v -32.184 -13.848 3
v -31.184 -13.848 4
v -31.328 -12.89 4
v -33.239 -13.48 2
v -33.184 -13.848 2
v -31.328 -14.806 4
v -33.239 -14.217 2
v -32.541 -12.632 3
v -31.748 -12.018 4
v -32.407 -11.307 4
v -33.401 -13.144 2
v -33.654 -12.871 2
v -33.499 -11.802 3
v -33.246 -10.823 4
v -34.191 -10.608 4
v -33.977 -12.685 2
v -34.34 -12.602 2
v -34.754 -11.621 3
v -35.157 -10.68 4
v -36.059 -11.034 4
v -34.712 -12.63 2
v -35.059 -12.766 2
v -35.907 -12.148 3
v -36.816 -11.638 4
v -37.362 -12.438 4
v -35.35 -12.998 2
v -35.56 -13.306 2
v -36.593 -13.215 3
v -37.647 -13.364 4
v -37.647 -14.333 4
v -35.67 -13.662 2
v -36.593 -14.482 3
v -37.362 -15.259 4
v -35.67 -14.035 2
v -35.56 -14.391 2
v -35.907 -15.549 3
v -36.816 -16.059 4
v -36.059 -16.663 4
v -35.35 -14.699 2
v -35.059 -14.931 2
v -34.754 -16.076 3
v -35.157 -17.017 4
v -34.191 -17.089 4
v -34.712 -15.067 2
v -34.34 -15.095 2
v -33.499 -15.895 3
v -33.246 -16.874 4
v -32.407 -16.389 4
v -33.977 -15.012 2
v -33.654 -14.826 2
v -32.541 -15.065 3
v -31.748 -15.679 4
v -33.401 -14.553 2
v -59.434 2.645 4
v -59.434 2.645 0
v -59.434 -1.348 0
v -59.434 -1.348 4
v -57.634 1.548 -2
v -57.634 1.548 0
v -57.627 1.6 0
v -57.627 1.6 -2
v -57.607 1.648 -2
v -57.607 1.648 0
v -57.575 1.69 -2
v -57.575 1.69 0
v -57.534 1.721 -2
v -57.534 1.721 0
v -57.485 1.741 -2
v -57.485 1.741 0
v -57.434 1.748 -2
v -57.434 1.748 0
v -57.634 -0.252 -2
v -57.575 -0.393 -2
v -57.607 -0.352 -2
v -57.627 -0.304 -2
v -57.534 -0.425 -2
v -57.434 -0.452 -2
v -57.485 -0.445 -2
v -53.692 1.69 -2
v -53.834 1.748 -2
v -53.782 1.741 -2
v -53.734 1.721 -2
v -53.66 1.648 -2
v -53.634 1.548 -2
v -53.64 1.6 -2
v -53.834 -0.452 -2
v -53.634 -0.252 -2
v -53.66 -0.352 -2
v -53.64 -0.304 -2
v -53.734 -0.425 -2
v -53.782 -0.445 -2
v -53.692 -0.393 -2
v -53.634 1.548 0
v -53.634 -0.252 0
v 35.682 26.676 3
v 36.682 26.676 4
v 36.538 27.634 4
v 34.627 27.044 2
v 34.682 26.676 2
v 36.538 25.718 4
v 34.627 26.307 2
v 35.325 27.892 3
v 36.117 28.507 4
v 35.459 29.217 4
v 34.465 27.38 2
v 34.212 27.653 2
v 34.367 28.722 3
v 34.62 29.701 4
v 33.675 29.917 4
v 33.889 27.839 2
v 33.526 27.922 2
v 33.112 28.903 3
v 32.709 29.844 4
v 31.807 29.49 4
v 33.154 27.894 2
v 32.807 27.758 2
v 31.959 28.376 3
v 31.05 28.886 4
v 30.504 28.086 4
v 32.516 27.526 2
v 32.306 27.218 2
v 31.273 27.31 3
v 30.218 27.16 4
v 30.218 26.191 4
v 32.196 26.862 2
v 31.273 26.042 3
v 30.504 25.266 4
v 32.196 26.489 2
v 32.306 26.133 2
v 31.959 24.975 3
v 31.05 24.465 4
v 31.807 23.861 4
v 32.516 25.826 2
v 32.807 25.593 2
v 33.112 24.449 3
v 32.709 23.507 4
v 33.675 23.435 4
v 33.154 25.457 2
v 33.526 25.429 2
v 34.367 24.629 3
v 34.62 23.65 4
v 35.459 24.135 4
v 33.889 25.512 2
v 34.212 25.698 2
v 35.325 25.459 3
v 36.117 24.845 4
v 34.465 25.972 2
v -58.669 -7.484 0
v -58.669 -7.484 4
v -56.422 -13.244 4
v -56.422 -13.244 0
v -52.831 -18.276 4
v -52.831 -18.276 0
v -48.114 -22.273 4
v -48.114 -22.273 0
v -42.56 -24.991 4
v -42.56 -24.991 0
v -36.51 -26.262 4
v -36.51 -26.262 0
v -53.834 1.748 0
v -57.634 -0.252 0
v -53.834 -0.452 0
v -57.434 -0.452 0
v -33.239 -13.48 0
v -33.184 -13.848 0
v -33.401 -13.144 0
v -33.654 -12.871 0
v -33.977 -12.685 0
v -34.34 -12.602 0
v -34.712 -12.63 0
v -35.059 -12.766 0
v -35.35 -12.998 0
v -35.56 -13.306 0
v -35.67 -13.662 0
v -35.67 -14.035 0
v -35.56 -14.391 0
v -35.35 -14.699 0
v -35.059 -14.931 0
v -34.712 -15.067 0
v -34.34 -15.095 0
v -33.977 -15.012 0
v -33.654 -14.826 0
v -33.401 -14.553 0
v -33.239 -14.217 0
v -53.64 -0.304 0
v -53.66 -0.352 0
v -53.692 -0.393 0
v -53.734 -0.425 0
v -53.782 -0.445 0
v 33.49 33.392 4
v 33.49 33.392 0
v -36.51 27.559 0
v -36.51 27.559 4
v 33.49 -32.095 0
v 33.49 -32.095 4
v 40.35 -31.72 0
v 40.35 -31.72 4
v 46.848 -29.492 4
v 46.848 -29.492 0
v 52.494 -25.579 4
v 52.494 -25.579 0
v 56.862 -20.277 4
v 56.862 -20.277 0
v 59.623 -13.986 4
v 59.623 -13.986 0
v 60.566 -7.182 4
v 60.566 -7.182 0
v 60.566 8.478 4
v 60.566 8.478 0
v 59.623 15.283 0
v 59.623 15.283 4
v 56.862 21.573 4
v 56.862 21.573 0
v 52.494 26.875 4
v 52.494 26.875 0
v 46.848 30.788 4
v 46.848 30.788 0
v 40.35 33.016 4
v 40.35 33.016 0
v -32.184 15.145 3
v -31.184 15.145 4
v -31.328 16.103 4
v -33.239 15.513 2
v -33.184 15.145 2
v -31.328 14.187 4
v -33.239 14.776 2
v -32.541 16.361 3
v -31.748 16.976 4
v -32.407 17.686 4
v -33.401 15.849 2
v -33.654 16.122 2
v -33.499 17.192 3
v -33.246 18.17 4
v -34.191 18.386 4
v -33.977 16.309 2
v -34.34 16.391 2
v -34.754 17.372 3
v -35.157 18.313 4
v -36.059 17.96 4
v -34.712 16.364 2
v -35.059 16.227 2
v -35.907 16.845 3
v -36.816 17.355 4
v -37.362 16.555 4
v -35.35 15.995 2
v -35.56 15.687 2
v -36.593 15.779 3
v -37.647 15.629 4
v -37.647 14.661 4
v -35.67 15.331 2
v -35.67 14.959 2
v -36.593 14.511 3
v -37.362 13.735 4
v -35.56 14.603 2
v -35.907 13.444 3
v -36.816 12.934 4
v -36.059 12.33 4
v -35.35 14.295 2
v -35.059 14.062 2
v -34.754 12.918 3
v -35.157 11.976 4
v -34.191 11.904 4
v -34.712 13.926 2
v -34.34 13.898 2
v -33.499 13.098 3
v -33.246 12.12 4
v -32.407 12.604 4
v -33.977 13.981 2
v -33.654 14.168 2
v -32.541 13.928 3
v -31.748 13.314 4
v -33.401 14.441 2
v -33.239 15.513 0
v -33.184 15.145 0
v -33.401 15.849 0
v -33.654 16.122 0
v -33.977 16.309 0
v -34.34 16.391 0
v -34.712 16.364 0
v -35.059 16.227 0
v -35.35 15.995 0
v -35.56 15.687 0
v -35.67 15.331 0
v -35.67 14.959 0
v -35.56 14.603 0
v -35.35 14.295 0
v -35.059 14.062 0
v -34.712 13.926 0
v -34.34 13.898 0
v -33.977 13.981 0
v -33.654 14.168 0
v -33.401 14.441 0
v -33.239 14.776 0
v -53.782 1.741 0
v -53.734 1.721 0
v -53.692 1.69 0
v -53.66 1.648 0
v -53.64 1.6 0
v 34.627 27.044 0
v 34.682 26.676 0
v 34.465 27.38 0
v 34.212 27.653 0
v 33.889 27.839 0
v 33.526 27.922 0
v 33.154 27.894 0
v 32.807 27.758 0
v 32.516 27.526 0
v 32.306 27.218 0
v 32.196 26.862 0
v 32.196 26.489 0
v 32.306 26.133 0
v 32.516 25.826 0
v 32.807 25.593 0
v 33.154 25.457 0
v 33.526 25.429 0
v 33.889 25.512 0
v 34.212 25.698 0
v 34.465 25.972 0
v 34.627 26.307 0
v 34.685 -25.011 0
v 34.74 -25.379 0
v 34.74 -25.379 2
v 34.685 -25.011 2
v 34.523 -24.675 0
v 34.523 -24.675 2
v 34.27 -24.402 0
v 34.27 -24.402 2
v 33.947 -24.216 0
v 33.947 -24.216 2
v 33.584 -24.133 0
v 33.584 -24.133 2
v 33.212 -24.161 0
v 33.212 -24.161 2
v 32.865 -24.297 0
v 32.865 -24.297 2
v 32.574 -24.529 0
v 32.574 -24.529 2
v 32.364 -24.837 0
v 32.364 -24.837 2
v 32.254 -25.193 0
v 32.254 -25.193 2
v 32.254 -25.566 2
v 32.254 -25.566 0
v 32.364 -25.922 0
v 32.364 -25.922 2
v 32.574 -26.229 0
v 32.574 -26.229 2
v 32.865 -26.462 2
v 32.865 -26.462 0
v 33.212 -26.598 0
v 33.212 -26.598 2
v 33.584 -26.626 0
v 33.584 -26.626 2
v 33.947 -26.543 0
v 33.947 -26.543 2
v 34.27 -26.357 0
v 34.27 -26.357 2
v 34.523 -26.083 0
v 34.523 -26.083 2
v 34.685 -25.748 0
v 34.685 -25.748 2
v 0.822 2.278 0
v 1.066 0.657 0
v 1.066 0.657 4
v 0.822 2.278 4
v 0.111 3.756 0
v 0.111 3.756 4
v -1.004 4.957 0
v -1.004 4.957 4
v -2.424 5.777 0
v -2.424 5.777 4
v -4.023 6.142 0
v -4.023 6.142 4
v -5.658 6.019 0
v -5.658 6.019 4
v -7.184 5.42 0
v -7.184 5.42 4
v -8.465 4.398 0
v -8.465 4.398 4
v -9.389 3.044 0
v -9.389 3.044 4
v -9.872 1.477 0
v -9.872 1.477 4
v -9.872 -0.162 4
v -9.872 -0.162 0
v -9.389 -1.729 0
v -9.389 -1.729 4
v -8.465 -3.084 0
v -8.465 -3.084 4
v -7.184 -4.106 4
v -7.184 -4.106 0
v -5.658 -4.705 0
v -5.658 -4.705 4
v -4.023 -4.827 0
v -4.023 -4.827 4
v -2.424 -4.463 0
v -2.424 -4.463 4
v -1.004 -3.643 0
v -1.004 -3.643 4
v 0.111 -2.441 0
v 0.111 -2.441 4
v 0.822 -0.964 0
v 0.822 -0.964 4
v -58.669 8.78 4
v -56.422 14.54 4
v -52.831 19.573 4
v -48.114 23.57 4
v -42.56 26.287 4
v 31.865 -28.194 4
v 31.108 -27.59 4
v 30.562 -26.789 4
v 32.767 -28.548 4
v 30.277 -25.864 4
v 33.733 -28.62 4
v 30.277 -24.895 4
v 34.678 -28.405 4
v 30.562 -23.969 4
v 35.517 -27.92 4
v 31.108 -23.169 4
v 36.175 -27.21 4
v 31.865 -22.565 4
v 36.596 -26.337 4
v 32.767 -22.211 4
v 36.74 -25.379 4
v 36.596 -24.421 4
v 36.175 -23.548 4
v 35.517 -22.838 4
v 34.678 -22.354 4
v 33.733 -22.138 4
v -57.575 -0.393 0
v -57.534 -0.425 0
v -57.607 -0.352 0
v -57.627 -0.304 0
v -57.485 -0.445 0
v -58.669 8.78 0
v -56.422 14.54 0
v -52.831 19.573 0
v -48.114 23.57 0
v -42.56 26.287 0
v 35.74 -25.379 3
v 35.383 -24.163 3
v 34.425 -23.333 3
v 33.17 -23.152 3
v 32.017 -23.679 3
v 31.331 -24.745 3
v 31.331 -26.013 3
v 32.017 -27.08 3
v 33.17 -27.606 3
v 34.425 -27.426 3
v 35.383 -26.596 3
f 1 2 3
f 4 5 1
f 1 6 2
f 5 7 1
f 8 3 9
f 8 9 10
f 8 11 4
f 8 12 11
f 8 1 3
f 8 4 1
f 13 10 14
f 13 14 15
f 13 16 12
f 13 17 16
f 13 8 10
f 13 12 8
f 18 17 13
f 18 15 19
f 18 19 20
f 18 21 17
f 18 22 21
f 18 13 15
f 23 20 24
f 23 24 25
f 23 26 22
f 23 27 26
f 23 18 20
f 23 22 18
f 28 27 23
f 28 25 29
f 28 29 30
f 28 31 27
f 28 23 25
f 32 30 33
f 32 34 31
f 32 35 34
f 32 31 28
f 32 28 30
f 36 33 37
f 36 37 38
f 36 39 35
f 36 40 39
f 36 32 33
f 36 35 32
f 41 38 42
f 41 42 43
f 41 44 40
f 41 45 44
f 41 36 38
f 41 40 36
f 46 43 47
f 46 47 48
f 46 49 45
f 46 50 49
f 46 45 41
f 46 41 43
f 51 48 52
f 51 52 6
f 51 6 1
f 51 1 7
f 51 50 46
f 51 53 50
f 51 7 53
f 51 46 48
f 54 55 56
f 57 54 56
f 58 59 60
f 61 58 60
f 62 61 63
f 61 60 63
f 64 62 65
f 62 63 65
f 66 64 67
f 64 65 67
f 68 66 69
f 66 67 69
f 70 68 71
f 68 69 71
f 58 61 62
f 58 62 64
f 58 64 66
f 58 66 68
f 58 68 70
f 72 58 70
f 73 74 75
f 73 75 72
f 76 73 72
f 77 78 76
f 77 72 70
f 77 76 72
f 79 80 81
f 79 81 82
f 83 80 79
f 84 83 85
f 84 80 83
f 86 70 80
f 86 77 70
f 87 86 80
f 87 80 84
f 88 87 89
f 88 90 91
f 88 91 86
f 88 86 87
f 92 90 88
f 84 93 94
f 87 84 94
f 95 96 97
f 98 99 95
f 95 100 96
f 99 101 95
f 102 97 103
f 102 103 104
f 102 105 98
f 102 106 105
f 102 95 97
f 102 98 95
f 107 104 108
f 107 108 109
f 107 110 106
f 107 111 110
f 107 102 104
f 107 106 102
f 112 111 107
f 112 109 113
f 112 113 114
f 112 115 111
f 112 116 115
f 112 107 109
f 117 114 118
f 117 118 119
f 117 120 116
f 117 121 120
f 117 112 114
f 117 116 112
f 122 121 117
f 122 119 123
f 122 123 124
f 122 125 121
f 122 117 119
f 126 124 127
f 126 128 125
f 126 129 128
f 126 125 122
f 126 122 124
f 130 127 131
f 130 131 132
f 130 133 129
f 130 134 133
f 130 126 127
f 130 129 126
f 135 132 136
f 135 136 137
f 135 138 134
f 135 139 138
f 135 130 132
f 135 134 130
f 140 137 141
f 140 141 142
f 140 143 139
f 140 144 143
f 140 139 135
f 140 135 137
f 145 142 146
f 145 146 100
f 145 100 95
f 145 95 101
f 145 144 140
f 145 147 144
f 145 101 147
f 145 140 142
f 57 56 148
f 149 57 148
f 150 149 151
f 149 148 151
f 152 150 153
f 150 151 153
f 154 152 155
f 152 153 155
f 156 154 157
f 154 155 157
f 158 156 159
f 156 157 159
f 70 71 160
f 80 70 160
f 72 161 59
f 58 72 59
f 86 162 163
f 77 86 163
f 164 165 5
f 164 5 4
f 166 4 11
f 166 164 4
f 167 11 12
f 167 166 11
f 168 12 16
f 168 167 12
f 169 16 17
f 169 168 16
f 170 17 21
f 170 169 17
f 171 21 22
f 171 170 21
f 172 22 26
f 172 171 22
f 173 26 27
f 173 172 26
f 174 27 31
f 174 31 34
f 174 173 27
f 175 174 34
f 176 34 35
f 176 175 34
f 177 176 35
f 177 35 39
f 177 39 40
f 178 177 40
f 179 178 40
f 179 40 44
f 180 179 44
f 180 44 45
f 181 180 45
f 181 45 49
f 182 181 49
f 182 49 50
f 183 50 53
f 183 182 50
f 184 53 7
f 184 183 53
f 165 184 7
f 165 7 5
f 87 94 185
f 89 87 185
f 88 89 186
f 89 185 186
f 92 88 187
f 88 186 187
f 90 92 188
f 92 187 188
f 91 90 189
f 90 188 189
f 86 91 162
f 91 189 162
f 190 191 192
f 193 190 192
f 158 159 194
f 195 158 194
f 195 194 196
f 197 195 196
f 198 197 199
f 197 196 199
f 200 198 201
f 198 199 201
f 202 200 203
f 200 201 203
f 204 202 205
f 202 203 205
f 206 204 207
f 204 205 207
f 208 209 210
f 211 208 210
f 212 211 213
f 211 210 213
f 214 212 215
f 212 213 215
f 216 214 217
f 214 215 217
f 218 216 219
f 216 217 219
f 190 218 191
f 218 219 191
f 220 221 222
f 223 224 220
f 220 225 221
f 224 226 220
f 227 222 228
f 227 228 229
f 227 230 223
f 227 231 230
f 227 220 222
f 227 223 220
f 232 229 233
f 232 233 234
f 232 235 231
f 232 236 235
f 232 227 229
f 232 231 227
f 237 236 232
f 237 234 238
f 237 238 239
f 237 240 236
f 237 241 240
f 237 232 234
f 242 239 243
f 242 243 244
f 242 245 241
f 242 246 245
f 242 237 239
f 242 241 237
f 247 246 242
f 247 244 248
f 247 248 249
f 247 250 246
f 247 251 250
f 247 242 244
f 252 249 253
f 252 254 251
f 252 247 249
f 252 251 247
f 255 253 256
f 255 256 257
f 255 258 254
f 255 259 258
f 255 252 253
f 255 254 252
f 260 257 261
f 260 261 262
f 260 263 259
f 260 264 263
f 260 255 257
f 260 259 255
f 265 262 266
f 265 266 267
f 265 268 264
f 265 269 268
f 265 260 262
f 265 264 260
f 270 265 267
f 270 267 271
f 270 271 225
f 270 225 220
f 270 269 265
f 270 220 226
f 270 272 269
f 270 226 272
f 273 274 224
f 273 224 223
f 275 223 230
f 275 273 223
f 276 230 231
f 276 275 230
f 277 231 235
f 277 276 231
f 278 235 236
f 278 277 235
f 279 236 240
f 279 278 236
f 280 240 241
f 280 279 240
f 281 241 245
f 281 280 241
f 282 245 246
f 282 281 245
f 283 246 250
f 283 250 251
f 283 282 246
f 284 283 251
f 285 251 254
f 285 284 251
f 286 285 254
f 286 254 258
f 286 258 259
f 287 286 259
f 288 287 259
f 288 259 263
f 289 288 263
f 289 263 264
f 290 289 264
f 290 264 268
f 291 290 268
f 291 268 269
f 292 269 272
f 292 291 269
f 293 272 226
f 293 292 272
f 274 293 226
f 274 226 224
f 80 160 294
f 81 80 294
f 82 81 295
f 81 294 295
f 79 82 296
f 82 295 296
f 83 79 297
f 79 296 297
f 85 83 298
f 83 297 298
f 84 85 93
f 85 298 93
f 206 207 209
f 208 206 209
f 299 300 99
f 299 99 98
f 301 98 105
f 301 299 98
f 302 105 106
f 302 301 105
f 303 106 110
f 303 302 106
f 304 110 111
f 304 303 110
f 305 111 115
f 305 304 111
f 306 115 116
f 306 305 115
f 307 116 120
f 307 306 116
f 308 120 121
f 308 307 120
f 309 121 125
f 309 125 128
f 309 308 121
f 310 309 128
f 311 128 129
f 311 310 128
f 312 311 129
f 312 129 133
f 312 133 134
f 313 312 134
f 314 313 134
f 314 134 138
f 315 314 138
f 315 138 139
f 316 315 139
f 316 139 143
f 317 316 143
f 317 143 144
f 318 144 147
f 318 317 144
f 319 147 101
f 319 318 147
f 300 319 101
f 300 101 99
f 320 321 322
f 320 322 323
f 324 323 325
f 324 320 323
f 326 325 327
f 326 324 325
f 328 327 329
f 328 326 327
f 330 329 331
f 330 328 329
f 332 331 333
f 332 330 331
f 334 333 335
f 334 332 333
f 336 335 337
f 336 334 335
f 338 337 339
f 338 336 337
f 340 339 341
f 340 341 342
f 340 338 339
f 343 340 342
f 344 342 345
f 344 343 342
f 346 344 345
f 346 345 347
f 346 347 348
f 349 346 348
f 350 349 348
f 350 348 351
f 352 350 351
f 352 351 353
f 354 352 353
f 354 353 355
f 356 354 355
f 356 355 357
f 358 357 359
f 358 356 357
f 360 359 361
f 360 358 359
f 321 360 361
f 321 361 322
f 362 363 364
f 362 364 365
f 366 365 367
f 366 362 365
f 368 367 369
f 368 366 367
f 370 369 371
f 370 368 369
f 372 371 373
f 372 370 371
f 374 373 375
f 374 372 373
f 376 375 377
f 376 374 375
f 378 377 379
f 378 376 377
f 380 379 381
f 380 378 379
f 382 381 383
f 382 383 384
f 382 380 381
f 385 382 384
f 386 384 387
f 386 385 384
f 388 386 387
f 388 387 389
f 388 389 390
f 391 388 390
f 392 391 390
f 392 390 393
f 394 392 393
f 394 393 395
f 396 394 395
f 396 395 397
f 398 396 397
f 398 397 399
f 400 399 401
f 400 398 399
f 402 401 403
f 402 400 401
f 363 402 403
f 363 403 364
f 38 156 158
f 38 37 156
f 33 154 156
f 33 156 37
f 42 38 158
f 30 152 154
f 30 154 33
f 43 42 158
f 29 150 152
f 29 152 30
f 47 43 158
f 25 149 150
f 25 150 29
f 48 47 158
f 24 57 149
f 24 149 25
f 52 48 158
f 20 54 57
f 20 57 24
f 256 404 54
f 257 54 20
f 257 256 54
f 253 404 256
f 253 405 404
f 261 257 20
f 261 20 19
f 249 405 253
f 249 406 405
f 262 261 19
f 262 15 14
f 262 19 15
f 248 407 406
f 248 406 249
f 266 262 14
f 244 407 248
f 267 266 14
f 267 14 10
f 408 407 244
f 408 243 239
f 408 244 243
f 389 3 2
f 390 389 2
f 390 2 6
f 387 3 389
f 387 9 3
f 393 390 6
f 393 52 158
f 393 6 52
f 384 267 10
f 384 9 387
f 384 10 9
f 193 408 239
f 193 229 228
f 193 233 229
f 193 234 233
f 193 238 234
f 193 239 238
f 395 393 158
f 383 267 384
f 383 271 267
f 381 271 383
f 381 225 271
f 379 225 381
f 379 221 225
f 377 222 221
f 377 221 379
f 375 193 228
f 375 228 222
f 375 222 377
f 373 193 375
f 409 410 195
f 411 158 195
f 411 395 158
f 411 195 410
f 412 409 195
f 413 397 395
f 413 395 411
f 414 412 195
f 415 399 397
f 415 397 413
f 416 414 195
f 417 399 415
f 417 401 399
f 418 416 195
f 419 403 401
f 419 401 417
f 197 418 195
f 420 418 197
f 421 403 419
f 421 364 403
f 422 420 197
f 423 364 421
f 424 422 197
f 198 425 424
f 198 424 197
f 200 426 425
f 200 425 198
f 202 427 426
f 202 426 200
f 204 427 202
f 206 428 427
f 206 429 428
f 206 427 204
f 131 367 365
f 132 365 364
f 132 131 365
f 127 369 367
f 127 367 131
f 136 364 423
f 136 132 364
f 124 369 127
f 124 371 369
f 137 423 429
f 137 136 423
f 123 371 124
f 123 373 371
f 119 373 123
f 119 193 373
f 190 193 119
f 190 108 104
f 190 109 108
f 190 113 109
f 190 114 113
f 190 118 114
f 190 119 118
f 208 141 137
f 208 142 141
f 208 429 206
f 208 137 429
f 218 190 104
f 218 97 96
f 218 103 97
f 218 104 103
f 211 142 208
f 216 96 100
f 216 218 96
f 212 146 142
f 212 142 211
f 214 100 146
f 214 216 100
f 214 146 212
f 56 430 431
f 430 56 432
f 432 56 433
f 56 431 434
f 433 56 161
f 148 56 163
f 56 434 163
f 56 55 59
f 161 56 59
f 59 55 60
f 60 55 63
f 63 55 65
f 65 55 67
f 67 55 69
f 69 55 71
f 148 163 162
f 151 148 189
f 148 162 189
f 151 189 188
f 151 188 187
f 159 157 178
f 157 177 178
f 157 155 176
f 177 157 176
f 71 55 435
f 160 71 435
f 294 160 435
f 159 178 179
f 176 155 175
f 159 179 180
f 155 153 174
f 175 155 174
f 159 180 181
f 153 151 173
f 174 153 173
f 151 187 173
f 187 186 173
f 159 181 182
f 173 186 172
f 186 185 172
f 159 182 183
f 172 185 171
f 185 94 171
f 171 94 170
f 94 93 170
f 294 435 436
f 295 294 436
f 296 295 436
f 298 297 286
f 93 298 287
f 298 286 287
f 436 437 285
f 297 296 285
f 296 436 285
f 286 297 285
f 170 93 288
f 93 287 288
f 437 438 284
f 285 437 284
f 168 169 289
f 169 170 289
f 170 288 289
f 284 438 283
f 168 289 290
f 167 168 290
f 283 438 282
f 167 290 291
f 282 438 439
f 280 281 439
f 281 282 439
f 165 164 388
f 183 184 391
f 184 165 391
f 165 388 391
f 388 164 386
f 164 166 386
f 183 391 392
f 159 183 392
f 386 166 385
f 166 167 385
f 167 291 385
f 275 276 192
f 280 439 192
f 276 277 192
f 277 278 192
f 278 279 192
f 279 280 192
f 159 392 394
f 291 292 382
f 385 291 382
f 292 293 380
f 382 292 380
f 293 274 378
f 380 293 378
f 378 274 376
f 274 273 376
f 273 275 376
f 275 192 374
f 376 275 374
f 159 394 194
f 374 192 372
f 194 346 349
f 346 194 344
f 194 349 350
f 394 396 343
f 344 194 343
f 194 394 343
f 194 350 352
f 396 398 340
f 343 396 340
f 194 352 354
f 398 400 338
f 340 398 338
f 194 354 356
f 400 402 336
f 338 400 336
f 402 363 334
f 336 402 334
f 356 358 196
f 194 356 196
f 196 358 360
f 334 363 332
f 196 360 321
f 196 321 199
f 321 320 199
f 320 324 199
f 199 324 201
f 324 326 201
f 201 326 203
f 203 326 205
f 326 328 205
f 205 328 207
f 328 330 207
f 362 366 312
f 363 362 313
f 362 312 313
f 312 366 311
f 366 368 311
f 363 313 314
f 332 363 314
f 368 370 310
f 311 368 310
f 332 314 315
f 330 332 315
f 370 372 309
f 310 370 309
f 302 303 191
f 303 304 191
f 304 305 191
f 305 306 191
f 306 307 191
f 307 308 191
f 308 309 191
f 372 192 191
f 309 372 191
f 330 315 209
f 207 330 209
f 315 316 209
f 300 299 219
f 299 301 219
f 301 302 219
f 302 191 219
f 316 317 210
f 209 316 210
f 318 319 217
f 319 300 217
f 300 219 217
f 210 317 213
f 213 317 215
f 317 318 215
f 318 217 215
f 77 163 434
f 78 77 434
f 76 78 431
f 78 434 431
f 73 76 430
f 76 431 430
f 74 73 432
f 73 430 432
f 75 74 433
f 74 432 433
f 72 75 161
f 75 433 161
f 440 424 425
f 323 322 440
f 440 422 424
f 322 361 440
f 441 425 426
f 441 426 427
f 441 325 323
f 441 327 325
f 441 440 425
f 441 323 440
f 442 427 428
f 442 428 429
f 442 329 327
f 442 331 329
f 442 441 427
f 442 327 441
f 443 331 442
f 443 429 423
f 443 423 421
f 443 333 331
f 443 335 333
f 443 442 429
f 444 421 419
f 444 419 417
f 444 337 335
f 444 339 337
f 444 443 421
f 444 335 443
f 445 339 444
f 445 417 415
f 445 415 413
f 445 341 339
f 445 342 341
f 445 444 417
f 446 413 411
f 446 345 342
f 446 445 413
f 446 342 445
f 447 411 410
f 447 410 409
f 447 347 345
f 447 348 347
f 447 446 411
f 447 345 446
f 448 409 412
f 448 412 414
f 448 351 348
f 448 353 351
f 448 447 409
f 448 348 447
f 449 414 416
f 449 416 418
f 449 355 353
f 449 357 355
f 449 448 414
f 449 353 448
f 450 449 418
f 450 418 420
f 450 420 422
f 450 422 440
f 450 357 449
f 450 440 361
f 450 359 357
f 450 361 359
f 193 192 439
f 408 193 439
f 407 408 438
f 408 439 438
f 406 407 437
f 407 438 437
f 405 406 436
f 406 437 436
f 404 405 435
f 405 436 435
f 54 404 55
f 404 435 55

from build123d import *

# Parameters (mm, degrees)
F0_R     = 1.25
F0_R_2   = 5.5
F1_DEPTH = 4
F3_DEPTH = 2
F4_SIZE  = 2


# Not quite as in the source:
# - a feature names something its author has since deleted; it is built from what else it names


with BuildPart() as f1:
    # F0 (on Top) → F1 (new body)
    with BuildSketch(Plane.XY):
        with BuildLine():
            ThreePointArc((-36.0336562554, 5.4360876058), (-41.0336562554, 10.4360876058), (-46.0336562554, 5.4360876058))
            ThreePointArc((-46.0336562554, 5.4360876058), (-48.7113140605, 0.9910484741), (-53.6336562554, -0.6517453414))
            Line((-53.6336562554, -0.6517453414), (-57.6336562554, -0.6517453414))
            Line((-57.6336562554, -0.6517453414), (-59.4336562554, -0.6517453414))
            Line((-59.4336562554, -0.6517453414), (-59.4336562554, -1.3484233022))
            ThreePointArc((-59.4336562554, -1.3484233022), (-52.8307134237, -18.2761605269), (-36.5097932518, -26.2620672584))
            Line((-36.5097932518, -26.2620672584), (33.4902067482, -32.0954005917))
            ThreePointArc((33.4902067482, -32.0954005917), (52.4940809692, -25.5788138039), (60.5663437446, -7.1817566356))
            Line((60.5663437446, -7.1817566356), (60.5663437446, 8.4782659528))
            ThreePointArc((60.5663437446, 8.4782659528), (52.4940809692, 26.8753231211), (33.4902067482, 33.3919099089))
            Line((33.4902067482, 33.3919099089), (-36.5097932518, 27.5585765756))
            ThreePointArc((-36.5097932518, 27.5585765756), (-52.8307134237, 19.5726698441), (-59.4336562554, 2.6449326195))
            Line((-59.4336562554, 2.6449326195), (-59.4336562554, 1.9482546586))
            Line((-59.4336562554, 1.9482546586), (-57.6336562554, 1.9482546586))
            Line((-57.6336562554, 1.9482546586), (-53.6336562554, 1.9482546586))
            ThreePointArc((-53.6336562554, 1.9482546586), (-50.3543429782, 2.8450290737), (-48.4065189788, 5.6314392355))
            ThreePointArc((-48.4065189788, 5.6314392355), (-40.8279863477, 12.5929298404), (-33.4336562554, 5.4360876058))
            ThreePointArc((-33.4336562554, 5.4360876058), (-31.5267024615, 2.8420068396), (-28.4336562554, 1.9482546586))
            Line((-28.4336562554, 1.9482546586), (-15.4336562554, 1.9482546586))
            Line((-15.4336562554, 1.9482546586), (-15.4336562554, 15.2482546586))
            Line((-15.4336562554, 15.2482546586), (-4.9336562554, 15.2482546586))
            Line((-4.9336562554, 15.2482546586), (-4.9336562554, 17.1757546586))
            ThreePointArc((-4.9336562554, 17.1757546586), (-0.8336562554, 21.2757546586), (3.2663437446, 17.1757546586))
            Line((3.2663437446, 17.1757546586), (3.2663437446, 15.2482546586))
            Line((3.2663437446, 15.2482546586), (29.2163437446, 15.2482546586))
            Line((29.2163437446, 15.2482546586), (29.2163437446, 17.1757546586))
            ThreePointArc((29.2163437446, 17.1757546586), (33.3163437446, 21.2757546586), (37.4163437446, 17.1757546586))
            Line((37.4163437446, 17.1757546586), (37.4163437446, 15.2482546586))
            Line((37.4163437446, 15.2482546586), (47.9163437446, 15.2482546586))
            Line((47.9163437446, 15.2482546586), (47.9163437446, -13.9517453414))
            Line((47.9163437446, -13.9517453414), (37.4163437446, -13.9517453414))
            Line((37.4163437446, -13.9517453414), (37.4163437446, -15.8792453414))
            ThreePointArc((37.4163437446, -15.8792453414), (33.3163437446, -19.9792453414), (29.2163437446, -15.8792453414))
            Line((29.2163437446, -15.8792453414), (29.2163437446, -13.9517453414))
            Line((29.2163437446, -13.9517453414), (3.2663437446, -13.9517453414))
            Line((3.2663437446, -13.9517453414), (3.2663437446, -15.8792453414))
            ThreePointArc((3.2663437446, -15.8792453414), (-0.8336562554, -19.9792453414), (-4.9336562554, -15.8792453414))
            Line((-4.9336562554, -15.8792453414), (-4.9336562554, -13.9517453414))
            Line((-4.9336562554, -13.9517453414), (-15.4336562554, -13.9517453414))
            Line((-15.4336562554, -13.9517453414), (-15.4336562554, -0.6517453414))
            Line((-15.4336562554, -0.6517453414), (-28.4336562554, -0.6517453414))
            ThreePointArc((-28.4336562554, -0.6517453414), (-33.3559984503, 0.991048474), (-36.0336562554, 5.4360876058))
        make_face()
        with Locations((-34.4336562554, -13.8484233022)):
            Circle(F0_R, mode=Mode.SUBTRACT)
        with Locations((33.4902067482, -25.3792453414)):
            Circle(F0_R, mode=Mode.SUBTRACT)
        with Locations((-34.4336562554, 15.1449326195)):
            Circle(F0_R, mode=Mode.SUBTRACT)
        with Locations((33.4321971192, 26.6757546586)):
            Circle(F0_R, mode=Mode.SUBTRACT)
        with BuildLine():
            ThreePointArc((-53.6336562554, -0.6517453414), (-48.7113140605, 0.9910484741), (-46.0336562554, 5.4360876058))
            ThreePointArc((-46.0336562554, 5.4360876058), (-41.0336562554, 10.4360876058), (-36.0336562554, 5.4360876058))
            ThreePointArc((-36.0336562554, 5.4360876058), (-33.3559984503, 0.991048474), (-28.4336562554, -0.6517453414))
            Line((-28.4336562554, -0.6517453414), (-15.4336562554, -0.6517453414))
            Line((-15.4336562554, -0.6517453414), (-15.4336562554, -13.9517453414))
            Line((-15.4336562554, -13.9517453414), (-4.9336562554, -13.9517453414))
            Line((-4.9336562554, -13.9517453414), (-4.9336562554, -15.8792453414))
            ThreePointArc((-4.9336562554, -15.8792453414), (-0.8336562554, -19.9792453414), (3.2663437446, -15.8792453414))
            Line((3.2663437446, -15.8792453414), (3.2663437446, -13.9517453414))
            Line((3.2663437446, -13.9517453414), (29.2163437446, -13.9517453414))
            Line((29.2163437446, -13.9517453414), (29.2163437446, -15.8792453414))
            ThreePointArc((29.2163437446, -15.8792453414), (33.3163437446, -19.9792453414), (37.4163437446, -15.8792453414))
            Line((37.4163437446, -15.8792453414), (37.4163437446, -13.9517453414))
            Line((37.4163437446, -13.9517453414), (47.9163437446, -13.9517453414))
            Line((47.9163437446, -13.9517453414), (47.9163437446, 15.2482546586))
            Line((47.9163437446, 15.2482546586), (37.4163437446, 15.2482546586))
            Line((37.4163437446, 15.2482546586), (37.4163437446, 17.1757546586))
            ThreePointArc((37.4163437446, 17.1757546586), (33.3163437446, 21.2757546586), (29.2163437446, 17.1757546586))
            Line((29.2163437446, 17.1757546586), (29.2163437446, 15.2482546586))
            Line((29.2163437446, 15.2482546586), (3.2663437446, 15.2482546586))
            Line((3.2663437446, 15.2482546586), (3.2663437446, 17.1757546586))
            ThreePointArc((3.2663437446, 17.1757546586), (-0.8336562554, 21.2757546586), (-4.9336562554, 17.1757546586))
            Line((-4.9336562554, 17.1757546586), (-4.9336562554, 15.2482546586))
            Line((-4.9336562554, 15.2482546586), (-15.4336562554, 15.2482546586))
            Line((-15.4336562554, 15.2482546586), (-15.4336562554, 1.9482546586))
            Line((-15.4336562554, 1.9482546586), (-28.4336562554, 1.9482546586))
            ThreePointArc((-28.4336562554, 1.9482546586), (-31.5267024615, 2.8420068396), (-33.4336562554, 5.4360876058))
            ThreePointArc((-33.4336562554, 5.4360876058), (-40.8279863477, 12.5929298404), (-48.4065189788, 5.6314392355))
            ThreePointArc((-48.4065189788, 5.6314392355), (-50.3543429782, 2.8450290737), (-53.6336562554, 1.9482546586))
            Line((-53.6336562554, 1.9482546586), (-53.6336562554, -0.6517453414))
        make_face()
        with Locations((-4.4336562554, 0.6572546586)):
            Circle(F0_R_2, mode=Mode.SUBTRACT)
        Polygon((-59.4336562554, -0.6517453414), (-57.6336562554, -0.6517453414), (-57.6336562554, 0.6482546586), (-57.6336562554, 1.9482546586), (-59.4336562554, 1.9482546586), align=None)
        Polygon((-57.6336562554, -0.6517453414), (-53.6336562554, -0.6517453414), (-53.6336562554, 1.9482546586), (-57.6336562554, 1.9482546586), (-57.6336562554, 0.6482546586), align=None)
    extrude(amount=F1_DEPTH)

    # F2 (on face) → F3 (join)
    with BuildSketch(Plane(origin=(0, 0, 0), x_dir=(1, 0, 0), z_dir=(0, 0, -1))):
        with BuildLine():
            ThreePointArc((-53.8336562554, -1.7482546586), (-53.6922348992, -1.6896760149), (-53.6336562554, -1.5482546586))
            Line((-53.6336562554, -1.5482546586), (-53.6336562554, 0.2517453414))
            ThreePointArc((-53.6336562554, 0.2517453414), (-53.6922348992, 0.3931666976), (-53.8336562554, 0.4517453414))
            Line((-53.8336562554, 0.4517453414), (-57.4336562554, 0.4517453414))
            ThreePointArc((-57.4336562554, 0.4517453414), (-57.5750776116, 0.3931666976), (-57.6336562554, 0.2517453414))
            Line((-57.6336562554, 0.2517453414), (-57.6336562554, -0.6482546586))
            Line((-57.6336562554, -0.6482546586), (-57.6336562554, -1.5482546586))
            ThreePointArc((-57.6336562554, -1.5482546586), (-57.5750776116, -1.6896760149), (-57.4336562554, -1.7482546586))
            Line((-57.4336562554, -1.7482546586), (-53.8336562554, -1.7482546586))
        make_face()
    extrude(amount=F3_DEPTH)

    # F4
    f4_edges = [f1.edges().sort_by_distance(p)[0] for p in [
        (-35.683656, 15.144933, 4),
        (-35.683656, -13.848423, 4),
        (32.182197, 26.675755, 4),
        (32.240207, -25.379245, 4),
    ]]
    chamfer(f4_edges, length=F4_SIZE)


solid = f1.part
